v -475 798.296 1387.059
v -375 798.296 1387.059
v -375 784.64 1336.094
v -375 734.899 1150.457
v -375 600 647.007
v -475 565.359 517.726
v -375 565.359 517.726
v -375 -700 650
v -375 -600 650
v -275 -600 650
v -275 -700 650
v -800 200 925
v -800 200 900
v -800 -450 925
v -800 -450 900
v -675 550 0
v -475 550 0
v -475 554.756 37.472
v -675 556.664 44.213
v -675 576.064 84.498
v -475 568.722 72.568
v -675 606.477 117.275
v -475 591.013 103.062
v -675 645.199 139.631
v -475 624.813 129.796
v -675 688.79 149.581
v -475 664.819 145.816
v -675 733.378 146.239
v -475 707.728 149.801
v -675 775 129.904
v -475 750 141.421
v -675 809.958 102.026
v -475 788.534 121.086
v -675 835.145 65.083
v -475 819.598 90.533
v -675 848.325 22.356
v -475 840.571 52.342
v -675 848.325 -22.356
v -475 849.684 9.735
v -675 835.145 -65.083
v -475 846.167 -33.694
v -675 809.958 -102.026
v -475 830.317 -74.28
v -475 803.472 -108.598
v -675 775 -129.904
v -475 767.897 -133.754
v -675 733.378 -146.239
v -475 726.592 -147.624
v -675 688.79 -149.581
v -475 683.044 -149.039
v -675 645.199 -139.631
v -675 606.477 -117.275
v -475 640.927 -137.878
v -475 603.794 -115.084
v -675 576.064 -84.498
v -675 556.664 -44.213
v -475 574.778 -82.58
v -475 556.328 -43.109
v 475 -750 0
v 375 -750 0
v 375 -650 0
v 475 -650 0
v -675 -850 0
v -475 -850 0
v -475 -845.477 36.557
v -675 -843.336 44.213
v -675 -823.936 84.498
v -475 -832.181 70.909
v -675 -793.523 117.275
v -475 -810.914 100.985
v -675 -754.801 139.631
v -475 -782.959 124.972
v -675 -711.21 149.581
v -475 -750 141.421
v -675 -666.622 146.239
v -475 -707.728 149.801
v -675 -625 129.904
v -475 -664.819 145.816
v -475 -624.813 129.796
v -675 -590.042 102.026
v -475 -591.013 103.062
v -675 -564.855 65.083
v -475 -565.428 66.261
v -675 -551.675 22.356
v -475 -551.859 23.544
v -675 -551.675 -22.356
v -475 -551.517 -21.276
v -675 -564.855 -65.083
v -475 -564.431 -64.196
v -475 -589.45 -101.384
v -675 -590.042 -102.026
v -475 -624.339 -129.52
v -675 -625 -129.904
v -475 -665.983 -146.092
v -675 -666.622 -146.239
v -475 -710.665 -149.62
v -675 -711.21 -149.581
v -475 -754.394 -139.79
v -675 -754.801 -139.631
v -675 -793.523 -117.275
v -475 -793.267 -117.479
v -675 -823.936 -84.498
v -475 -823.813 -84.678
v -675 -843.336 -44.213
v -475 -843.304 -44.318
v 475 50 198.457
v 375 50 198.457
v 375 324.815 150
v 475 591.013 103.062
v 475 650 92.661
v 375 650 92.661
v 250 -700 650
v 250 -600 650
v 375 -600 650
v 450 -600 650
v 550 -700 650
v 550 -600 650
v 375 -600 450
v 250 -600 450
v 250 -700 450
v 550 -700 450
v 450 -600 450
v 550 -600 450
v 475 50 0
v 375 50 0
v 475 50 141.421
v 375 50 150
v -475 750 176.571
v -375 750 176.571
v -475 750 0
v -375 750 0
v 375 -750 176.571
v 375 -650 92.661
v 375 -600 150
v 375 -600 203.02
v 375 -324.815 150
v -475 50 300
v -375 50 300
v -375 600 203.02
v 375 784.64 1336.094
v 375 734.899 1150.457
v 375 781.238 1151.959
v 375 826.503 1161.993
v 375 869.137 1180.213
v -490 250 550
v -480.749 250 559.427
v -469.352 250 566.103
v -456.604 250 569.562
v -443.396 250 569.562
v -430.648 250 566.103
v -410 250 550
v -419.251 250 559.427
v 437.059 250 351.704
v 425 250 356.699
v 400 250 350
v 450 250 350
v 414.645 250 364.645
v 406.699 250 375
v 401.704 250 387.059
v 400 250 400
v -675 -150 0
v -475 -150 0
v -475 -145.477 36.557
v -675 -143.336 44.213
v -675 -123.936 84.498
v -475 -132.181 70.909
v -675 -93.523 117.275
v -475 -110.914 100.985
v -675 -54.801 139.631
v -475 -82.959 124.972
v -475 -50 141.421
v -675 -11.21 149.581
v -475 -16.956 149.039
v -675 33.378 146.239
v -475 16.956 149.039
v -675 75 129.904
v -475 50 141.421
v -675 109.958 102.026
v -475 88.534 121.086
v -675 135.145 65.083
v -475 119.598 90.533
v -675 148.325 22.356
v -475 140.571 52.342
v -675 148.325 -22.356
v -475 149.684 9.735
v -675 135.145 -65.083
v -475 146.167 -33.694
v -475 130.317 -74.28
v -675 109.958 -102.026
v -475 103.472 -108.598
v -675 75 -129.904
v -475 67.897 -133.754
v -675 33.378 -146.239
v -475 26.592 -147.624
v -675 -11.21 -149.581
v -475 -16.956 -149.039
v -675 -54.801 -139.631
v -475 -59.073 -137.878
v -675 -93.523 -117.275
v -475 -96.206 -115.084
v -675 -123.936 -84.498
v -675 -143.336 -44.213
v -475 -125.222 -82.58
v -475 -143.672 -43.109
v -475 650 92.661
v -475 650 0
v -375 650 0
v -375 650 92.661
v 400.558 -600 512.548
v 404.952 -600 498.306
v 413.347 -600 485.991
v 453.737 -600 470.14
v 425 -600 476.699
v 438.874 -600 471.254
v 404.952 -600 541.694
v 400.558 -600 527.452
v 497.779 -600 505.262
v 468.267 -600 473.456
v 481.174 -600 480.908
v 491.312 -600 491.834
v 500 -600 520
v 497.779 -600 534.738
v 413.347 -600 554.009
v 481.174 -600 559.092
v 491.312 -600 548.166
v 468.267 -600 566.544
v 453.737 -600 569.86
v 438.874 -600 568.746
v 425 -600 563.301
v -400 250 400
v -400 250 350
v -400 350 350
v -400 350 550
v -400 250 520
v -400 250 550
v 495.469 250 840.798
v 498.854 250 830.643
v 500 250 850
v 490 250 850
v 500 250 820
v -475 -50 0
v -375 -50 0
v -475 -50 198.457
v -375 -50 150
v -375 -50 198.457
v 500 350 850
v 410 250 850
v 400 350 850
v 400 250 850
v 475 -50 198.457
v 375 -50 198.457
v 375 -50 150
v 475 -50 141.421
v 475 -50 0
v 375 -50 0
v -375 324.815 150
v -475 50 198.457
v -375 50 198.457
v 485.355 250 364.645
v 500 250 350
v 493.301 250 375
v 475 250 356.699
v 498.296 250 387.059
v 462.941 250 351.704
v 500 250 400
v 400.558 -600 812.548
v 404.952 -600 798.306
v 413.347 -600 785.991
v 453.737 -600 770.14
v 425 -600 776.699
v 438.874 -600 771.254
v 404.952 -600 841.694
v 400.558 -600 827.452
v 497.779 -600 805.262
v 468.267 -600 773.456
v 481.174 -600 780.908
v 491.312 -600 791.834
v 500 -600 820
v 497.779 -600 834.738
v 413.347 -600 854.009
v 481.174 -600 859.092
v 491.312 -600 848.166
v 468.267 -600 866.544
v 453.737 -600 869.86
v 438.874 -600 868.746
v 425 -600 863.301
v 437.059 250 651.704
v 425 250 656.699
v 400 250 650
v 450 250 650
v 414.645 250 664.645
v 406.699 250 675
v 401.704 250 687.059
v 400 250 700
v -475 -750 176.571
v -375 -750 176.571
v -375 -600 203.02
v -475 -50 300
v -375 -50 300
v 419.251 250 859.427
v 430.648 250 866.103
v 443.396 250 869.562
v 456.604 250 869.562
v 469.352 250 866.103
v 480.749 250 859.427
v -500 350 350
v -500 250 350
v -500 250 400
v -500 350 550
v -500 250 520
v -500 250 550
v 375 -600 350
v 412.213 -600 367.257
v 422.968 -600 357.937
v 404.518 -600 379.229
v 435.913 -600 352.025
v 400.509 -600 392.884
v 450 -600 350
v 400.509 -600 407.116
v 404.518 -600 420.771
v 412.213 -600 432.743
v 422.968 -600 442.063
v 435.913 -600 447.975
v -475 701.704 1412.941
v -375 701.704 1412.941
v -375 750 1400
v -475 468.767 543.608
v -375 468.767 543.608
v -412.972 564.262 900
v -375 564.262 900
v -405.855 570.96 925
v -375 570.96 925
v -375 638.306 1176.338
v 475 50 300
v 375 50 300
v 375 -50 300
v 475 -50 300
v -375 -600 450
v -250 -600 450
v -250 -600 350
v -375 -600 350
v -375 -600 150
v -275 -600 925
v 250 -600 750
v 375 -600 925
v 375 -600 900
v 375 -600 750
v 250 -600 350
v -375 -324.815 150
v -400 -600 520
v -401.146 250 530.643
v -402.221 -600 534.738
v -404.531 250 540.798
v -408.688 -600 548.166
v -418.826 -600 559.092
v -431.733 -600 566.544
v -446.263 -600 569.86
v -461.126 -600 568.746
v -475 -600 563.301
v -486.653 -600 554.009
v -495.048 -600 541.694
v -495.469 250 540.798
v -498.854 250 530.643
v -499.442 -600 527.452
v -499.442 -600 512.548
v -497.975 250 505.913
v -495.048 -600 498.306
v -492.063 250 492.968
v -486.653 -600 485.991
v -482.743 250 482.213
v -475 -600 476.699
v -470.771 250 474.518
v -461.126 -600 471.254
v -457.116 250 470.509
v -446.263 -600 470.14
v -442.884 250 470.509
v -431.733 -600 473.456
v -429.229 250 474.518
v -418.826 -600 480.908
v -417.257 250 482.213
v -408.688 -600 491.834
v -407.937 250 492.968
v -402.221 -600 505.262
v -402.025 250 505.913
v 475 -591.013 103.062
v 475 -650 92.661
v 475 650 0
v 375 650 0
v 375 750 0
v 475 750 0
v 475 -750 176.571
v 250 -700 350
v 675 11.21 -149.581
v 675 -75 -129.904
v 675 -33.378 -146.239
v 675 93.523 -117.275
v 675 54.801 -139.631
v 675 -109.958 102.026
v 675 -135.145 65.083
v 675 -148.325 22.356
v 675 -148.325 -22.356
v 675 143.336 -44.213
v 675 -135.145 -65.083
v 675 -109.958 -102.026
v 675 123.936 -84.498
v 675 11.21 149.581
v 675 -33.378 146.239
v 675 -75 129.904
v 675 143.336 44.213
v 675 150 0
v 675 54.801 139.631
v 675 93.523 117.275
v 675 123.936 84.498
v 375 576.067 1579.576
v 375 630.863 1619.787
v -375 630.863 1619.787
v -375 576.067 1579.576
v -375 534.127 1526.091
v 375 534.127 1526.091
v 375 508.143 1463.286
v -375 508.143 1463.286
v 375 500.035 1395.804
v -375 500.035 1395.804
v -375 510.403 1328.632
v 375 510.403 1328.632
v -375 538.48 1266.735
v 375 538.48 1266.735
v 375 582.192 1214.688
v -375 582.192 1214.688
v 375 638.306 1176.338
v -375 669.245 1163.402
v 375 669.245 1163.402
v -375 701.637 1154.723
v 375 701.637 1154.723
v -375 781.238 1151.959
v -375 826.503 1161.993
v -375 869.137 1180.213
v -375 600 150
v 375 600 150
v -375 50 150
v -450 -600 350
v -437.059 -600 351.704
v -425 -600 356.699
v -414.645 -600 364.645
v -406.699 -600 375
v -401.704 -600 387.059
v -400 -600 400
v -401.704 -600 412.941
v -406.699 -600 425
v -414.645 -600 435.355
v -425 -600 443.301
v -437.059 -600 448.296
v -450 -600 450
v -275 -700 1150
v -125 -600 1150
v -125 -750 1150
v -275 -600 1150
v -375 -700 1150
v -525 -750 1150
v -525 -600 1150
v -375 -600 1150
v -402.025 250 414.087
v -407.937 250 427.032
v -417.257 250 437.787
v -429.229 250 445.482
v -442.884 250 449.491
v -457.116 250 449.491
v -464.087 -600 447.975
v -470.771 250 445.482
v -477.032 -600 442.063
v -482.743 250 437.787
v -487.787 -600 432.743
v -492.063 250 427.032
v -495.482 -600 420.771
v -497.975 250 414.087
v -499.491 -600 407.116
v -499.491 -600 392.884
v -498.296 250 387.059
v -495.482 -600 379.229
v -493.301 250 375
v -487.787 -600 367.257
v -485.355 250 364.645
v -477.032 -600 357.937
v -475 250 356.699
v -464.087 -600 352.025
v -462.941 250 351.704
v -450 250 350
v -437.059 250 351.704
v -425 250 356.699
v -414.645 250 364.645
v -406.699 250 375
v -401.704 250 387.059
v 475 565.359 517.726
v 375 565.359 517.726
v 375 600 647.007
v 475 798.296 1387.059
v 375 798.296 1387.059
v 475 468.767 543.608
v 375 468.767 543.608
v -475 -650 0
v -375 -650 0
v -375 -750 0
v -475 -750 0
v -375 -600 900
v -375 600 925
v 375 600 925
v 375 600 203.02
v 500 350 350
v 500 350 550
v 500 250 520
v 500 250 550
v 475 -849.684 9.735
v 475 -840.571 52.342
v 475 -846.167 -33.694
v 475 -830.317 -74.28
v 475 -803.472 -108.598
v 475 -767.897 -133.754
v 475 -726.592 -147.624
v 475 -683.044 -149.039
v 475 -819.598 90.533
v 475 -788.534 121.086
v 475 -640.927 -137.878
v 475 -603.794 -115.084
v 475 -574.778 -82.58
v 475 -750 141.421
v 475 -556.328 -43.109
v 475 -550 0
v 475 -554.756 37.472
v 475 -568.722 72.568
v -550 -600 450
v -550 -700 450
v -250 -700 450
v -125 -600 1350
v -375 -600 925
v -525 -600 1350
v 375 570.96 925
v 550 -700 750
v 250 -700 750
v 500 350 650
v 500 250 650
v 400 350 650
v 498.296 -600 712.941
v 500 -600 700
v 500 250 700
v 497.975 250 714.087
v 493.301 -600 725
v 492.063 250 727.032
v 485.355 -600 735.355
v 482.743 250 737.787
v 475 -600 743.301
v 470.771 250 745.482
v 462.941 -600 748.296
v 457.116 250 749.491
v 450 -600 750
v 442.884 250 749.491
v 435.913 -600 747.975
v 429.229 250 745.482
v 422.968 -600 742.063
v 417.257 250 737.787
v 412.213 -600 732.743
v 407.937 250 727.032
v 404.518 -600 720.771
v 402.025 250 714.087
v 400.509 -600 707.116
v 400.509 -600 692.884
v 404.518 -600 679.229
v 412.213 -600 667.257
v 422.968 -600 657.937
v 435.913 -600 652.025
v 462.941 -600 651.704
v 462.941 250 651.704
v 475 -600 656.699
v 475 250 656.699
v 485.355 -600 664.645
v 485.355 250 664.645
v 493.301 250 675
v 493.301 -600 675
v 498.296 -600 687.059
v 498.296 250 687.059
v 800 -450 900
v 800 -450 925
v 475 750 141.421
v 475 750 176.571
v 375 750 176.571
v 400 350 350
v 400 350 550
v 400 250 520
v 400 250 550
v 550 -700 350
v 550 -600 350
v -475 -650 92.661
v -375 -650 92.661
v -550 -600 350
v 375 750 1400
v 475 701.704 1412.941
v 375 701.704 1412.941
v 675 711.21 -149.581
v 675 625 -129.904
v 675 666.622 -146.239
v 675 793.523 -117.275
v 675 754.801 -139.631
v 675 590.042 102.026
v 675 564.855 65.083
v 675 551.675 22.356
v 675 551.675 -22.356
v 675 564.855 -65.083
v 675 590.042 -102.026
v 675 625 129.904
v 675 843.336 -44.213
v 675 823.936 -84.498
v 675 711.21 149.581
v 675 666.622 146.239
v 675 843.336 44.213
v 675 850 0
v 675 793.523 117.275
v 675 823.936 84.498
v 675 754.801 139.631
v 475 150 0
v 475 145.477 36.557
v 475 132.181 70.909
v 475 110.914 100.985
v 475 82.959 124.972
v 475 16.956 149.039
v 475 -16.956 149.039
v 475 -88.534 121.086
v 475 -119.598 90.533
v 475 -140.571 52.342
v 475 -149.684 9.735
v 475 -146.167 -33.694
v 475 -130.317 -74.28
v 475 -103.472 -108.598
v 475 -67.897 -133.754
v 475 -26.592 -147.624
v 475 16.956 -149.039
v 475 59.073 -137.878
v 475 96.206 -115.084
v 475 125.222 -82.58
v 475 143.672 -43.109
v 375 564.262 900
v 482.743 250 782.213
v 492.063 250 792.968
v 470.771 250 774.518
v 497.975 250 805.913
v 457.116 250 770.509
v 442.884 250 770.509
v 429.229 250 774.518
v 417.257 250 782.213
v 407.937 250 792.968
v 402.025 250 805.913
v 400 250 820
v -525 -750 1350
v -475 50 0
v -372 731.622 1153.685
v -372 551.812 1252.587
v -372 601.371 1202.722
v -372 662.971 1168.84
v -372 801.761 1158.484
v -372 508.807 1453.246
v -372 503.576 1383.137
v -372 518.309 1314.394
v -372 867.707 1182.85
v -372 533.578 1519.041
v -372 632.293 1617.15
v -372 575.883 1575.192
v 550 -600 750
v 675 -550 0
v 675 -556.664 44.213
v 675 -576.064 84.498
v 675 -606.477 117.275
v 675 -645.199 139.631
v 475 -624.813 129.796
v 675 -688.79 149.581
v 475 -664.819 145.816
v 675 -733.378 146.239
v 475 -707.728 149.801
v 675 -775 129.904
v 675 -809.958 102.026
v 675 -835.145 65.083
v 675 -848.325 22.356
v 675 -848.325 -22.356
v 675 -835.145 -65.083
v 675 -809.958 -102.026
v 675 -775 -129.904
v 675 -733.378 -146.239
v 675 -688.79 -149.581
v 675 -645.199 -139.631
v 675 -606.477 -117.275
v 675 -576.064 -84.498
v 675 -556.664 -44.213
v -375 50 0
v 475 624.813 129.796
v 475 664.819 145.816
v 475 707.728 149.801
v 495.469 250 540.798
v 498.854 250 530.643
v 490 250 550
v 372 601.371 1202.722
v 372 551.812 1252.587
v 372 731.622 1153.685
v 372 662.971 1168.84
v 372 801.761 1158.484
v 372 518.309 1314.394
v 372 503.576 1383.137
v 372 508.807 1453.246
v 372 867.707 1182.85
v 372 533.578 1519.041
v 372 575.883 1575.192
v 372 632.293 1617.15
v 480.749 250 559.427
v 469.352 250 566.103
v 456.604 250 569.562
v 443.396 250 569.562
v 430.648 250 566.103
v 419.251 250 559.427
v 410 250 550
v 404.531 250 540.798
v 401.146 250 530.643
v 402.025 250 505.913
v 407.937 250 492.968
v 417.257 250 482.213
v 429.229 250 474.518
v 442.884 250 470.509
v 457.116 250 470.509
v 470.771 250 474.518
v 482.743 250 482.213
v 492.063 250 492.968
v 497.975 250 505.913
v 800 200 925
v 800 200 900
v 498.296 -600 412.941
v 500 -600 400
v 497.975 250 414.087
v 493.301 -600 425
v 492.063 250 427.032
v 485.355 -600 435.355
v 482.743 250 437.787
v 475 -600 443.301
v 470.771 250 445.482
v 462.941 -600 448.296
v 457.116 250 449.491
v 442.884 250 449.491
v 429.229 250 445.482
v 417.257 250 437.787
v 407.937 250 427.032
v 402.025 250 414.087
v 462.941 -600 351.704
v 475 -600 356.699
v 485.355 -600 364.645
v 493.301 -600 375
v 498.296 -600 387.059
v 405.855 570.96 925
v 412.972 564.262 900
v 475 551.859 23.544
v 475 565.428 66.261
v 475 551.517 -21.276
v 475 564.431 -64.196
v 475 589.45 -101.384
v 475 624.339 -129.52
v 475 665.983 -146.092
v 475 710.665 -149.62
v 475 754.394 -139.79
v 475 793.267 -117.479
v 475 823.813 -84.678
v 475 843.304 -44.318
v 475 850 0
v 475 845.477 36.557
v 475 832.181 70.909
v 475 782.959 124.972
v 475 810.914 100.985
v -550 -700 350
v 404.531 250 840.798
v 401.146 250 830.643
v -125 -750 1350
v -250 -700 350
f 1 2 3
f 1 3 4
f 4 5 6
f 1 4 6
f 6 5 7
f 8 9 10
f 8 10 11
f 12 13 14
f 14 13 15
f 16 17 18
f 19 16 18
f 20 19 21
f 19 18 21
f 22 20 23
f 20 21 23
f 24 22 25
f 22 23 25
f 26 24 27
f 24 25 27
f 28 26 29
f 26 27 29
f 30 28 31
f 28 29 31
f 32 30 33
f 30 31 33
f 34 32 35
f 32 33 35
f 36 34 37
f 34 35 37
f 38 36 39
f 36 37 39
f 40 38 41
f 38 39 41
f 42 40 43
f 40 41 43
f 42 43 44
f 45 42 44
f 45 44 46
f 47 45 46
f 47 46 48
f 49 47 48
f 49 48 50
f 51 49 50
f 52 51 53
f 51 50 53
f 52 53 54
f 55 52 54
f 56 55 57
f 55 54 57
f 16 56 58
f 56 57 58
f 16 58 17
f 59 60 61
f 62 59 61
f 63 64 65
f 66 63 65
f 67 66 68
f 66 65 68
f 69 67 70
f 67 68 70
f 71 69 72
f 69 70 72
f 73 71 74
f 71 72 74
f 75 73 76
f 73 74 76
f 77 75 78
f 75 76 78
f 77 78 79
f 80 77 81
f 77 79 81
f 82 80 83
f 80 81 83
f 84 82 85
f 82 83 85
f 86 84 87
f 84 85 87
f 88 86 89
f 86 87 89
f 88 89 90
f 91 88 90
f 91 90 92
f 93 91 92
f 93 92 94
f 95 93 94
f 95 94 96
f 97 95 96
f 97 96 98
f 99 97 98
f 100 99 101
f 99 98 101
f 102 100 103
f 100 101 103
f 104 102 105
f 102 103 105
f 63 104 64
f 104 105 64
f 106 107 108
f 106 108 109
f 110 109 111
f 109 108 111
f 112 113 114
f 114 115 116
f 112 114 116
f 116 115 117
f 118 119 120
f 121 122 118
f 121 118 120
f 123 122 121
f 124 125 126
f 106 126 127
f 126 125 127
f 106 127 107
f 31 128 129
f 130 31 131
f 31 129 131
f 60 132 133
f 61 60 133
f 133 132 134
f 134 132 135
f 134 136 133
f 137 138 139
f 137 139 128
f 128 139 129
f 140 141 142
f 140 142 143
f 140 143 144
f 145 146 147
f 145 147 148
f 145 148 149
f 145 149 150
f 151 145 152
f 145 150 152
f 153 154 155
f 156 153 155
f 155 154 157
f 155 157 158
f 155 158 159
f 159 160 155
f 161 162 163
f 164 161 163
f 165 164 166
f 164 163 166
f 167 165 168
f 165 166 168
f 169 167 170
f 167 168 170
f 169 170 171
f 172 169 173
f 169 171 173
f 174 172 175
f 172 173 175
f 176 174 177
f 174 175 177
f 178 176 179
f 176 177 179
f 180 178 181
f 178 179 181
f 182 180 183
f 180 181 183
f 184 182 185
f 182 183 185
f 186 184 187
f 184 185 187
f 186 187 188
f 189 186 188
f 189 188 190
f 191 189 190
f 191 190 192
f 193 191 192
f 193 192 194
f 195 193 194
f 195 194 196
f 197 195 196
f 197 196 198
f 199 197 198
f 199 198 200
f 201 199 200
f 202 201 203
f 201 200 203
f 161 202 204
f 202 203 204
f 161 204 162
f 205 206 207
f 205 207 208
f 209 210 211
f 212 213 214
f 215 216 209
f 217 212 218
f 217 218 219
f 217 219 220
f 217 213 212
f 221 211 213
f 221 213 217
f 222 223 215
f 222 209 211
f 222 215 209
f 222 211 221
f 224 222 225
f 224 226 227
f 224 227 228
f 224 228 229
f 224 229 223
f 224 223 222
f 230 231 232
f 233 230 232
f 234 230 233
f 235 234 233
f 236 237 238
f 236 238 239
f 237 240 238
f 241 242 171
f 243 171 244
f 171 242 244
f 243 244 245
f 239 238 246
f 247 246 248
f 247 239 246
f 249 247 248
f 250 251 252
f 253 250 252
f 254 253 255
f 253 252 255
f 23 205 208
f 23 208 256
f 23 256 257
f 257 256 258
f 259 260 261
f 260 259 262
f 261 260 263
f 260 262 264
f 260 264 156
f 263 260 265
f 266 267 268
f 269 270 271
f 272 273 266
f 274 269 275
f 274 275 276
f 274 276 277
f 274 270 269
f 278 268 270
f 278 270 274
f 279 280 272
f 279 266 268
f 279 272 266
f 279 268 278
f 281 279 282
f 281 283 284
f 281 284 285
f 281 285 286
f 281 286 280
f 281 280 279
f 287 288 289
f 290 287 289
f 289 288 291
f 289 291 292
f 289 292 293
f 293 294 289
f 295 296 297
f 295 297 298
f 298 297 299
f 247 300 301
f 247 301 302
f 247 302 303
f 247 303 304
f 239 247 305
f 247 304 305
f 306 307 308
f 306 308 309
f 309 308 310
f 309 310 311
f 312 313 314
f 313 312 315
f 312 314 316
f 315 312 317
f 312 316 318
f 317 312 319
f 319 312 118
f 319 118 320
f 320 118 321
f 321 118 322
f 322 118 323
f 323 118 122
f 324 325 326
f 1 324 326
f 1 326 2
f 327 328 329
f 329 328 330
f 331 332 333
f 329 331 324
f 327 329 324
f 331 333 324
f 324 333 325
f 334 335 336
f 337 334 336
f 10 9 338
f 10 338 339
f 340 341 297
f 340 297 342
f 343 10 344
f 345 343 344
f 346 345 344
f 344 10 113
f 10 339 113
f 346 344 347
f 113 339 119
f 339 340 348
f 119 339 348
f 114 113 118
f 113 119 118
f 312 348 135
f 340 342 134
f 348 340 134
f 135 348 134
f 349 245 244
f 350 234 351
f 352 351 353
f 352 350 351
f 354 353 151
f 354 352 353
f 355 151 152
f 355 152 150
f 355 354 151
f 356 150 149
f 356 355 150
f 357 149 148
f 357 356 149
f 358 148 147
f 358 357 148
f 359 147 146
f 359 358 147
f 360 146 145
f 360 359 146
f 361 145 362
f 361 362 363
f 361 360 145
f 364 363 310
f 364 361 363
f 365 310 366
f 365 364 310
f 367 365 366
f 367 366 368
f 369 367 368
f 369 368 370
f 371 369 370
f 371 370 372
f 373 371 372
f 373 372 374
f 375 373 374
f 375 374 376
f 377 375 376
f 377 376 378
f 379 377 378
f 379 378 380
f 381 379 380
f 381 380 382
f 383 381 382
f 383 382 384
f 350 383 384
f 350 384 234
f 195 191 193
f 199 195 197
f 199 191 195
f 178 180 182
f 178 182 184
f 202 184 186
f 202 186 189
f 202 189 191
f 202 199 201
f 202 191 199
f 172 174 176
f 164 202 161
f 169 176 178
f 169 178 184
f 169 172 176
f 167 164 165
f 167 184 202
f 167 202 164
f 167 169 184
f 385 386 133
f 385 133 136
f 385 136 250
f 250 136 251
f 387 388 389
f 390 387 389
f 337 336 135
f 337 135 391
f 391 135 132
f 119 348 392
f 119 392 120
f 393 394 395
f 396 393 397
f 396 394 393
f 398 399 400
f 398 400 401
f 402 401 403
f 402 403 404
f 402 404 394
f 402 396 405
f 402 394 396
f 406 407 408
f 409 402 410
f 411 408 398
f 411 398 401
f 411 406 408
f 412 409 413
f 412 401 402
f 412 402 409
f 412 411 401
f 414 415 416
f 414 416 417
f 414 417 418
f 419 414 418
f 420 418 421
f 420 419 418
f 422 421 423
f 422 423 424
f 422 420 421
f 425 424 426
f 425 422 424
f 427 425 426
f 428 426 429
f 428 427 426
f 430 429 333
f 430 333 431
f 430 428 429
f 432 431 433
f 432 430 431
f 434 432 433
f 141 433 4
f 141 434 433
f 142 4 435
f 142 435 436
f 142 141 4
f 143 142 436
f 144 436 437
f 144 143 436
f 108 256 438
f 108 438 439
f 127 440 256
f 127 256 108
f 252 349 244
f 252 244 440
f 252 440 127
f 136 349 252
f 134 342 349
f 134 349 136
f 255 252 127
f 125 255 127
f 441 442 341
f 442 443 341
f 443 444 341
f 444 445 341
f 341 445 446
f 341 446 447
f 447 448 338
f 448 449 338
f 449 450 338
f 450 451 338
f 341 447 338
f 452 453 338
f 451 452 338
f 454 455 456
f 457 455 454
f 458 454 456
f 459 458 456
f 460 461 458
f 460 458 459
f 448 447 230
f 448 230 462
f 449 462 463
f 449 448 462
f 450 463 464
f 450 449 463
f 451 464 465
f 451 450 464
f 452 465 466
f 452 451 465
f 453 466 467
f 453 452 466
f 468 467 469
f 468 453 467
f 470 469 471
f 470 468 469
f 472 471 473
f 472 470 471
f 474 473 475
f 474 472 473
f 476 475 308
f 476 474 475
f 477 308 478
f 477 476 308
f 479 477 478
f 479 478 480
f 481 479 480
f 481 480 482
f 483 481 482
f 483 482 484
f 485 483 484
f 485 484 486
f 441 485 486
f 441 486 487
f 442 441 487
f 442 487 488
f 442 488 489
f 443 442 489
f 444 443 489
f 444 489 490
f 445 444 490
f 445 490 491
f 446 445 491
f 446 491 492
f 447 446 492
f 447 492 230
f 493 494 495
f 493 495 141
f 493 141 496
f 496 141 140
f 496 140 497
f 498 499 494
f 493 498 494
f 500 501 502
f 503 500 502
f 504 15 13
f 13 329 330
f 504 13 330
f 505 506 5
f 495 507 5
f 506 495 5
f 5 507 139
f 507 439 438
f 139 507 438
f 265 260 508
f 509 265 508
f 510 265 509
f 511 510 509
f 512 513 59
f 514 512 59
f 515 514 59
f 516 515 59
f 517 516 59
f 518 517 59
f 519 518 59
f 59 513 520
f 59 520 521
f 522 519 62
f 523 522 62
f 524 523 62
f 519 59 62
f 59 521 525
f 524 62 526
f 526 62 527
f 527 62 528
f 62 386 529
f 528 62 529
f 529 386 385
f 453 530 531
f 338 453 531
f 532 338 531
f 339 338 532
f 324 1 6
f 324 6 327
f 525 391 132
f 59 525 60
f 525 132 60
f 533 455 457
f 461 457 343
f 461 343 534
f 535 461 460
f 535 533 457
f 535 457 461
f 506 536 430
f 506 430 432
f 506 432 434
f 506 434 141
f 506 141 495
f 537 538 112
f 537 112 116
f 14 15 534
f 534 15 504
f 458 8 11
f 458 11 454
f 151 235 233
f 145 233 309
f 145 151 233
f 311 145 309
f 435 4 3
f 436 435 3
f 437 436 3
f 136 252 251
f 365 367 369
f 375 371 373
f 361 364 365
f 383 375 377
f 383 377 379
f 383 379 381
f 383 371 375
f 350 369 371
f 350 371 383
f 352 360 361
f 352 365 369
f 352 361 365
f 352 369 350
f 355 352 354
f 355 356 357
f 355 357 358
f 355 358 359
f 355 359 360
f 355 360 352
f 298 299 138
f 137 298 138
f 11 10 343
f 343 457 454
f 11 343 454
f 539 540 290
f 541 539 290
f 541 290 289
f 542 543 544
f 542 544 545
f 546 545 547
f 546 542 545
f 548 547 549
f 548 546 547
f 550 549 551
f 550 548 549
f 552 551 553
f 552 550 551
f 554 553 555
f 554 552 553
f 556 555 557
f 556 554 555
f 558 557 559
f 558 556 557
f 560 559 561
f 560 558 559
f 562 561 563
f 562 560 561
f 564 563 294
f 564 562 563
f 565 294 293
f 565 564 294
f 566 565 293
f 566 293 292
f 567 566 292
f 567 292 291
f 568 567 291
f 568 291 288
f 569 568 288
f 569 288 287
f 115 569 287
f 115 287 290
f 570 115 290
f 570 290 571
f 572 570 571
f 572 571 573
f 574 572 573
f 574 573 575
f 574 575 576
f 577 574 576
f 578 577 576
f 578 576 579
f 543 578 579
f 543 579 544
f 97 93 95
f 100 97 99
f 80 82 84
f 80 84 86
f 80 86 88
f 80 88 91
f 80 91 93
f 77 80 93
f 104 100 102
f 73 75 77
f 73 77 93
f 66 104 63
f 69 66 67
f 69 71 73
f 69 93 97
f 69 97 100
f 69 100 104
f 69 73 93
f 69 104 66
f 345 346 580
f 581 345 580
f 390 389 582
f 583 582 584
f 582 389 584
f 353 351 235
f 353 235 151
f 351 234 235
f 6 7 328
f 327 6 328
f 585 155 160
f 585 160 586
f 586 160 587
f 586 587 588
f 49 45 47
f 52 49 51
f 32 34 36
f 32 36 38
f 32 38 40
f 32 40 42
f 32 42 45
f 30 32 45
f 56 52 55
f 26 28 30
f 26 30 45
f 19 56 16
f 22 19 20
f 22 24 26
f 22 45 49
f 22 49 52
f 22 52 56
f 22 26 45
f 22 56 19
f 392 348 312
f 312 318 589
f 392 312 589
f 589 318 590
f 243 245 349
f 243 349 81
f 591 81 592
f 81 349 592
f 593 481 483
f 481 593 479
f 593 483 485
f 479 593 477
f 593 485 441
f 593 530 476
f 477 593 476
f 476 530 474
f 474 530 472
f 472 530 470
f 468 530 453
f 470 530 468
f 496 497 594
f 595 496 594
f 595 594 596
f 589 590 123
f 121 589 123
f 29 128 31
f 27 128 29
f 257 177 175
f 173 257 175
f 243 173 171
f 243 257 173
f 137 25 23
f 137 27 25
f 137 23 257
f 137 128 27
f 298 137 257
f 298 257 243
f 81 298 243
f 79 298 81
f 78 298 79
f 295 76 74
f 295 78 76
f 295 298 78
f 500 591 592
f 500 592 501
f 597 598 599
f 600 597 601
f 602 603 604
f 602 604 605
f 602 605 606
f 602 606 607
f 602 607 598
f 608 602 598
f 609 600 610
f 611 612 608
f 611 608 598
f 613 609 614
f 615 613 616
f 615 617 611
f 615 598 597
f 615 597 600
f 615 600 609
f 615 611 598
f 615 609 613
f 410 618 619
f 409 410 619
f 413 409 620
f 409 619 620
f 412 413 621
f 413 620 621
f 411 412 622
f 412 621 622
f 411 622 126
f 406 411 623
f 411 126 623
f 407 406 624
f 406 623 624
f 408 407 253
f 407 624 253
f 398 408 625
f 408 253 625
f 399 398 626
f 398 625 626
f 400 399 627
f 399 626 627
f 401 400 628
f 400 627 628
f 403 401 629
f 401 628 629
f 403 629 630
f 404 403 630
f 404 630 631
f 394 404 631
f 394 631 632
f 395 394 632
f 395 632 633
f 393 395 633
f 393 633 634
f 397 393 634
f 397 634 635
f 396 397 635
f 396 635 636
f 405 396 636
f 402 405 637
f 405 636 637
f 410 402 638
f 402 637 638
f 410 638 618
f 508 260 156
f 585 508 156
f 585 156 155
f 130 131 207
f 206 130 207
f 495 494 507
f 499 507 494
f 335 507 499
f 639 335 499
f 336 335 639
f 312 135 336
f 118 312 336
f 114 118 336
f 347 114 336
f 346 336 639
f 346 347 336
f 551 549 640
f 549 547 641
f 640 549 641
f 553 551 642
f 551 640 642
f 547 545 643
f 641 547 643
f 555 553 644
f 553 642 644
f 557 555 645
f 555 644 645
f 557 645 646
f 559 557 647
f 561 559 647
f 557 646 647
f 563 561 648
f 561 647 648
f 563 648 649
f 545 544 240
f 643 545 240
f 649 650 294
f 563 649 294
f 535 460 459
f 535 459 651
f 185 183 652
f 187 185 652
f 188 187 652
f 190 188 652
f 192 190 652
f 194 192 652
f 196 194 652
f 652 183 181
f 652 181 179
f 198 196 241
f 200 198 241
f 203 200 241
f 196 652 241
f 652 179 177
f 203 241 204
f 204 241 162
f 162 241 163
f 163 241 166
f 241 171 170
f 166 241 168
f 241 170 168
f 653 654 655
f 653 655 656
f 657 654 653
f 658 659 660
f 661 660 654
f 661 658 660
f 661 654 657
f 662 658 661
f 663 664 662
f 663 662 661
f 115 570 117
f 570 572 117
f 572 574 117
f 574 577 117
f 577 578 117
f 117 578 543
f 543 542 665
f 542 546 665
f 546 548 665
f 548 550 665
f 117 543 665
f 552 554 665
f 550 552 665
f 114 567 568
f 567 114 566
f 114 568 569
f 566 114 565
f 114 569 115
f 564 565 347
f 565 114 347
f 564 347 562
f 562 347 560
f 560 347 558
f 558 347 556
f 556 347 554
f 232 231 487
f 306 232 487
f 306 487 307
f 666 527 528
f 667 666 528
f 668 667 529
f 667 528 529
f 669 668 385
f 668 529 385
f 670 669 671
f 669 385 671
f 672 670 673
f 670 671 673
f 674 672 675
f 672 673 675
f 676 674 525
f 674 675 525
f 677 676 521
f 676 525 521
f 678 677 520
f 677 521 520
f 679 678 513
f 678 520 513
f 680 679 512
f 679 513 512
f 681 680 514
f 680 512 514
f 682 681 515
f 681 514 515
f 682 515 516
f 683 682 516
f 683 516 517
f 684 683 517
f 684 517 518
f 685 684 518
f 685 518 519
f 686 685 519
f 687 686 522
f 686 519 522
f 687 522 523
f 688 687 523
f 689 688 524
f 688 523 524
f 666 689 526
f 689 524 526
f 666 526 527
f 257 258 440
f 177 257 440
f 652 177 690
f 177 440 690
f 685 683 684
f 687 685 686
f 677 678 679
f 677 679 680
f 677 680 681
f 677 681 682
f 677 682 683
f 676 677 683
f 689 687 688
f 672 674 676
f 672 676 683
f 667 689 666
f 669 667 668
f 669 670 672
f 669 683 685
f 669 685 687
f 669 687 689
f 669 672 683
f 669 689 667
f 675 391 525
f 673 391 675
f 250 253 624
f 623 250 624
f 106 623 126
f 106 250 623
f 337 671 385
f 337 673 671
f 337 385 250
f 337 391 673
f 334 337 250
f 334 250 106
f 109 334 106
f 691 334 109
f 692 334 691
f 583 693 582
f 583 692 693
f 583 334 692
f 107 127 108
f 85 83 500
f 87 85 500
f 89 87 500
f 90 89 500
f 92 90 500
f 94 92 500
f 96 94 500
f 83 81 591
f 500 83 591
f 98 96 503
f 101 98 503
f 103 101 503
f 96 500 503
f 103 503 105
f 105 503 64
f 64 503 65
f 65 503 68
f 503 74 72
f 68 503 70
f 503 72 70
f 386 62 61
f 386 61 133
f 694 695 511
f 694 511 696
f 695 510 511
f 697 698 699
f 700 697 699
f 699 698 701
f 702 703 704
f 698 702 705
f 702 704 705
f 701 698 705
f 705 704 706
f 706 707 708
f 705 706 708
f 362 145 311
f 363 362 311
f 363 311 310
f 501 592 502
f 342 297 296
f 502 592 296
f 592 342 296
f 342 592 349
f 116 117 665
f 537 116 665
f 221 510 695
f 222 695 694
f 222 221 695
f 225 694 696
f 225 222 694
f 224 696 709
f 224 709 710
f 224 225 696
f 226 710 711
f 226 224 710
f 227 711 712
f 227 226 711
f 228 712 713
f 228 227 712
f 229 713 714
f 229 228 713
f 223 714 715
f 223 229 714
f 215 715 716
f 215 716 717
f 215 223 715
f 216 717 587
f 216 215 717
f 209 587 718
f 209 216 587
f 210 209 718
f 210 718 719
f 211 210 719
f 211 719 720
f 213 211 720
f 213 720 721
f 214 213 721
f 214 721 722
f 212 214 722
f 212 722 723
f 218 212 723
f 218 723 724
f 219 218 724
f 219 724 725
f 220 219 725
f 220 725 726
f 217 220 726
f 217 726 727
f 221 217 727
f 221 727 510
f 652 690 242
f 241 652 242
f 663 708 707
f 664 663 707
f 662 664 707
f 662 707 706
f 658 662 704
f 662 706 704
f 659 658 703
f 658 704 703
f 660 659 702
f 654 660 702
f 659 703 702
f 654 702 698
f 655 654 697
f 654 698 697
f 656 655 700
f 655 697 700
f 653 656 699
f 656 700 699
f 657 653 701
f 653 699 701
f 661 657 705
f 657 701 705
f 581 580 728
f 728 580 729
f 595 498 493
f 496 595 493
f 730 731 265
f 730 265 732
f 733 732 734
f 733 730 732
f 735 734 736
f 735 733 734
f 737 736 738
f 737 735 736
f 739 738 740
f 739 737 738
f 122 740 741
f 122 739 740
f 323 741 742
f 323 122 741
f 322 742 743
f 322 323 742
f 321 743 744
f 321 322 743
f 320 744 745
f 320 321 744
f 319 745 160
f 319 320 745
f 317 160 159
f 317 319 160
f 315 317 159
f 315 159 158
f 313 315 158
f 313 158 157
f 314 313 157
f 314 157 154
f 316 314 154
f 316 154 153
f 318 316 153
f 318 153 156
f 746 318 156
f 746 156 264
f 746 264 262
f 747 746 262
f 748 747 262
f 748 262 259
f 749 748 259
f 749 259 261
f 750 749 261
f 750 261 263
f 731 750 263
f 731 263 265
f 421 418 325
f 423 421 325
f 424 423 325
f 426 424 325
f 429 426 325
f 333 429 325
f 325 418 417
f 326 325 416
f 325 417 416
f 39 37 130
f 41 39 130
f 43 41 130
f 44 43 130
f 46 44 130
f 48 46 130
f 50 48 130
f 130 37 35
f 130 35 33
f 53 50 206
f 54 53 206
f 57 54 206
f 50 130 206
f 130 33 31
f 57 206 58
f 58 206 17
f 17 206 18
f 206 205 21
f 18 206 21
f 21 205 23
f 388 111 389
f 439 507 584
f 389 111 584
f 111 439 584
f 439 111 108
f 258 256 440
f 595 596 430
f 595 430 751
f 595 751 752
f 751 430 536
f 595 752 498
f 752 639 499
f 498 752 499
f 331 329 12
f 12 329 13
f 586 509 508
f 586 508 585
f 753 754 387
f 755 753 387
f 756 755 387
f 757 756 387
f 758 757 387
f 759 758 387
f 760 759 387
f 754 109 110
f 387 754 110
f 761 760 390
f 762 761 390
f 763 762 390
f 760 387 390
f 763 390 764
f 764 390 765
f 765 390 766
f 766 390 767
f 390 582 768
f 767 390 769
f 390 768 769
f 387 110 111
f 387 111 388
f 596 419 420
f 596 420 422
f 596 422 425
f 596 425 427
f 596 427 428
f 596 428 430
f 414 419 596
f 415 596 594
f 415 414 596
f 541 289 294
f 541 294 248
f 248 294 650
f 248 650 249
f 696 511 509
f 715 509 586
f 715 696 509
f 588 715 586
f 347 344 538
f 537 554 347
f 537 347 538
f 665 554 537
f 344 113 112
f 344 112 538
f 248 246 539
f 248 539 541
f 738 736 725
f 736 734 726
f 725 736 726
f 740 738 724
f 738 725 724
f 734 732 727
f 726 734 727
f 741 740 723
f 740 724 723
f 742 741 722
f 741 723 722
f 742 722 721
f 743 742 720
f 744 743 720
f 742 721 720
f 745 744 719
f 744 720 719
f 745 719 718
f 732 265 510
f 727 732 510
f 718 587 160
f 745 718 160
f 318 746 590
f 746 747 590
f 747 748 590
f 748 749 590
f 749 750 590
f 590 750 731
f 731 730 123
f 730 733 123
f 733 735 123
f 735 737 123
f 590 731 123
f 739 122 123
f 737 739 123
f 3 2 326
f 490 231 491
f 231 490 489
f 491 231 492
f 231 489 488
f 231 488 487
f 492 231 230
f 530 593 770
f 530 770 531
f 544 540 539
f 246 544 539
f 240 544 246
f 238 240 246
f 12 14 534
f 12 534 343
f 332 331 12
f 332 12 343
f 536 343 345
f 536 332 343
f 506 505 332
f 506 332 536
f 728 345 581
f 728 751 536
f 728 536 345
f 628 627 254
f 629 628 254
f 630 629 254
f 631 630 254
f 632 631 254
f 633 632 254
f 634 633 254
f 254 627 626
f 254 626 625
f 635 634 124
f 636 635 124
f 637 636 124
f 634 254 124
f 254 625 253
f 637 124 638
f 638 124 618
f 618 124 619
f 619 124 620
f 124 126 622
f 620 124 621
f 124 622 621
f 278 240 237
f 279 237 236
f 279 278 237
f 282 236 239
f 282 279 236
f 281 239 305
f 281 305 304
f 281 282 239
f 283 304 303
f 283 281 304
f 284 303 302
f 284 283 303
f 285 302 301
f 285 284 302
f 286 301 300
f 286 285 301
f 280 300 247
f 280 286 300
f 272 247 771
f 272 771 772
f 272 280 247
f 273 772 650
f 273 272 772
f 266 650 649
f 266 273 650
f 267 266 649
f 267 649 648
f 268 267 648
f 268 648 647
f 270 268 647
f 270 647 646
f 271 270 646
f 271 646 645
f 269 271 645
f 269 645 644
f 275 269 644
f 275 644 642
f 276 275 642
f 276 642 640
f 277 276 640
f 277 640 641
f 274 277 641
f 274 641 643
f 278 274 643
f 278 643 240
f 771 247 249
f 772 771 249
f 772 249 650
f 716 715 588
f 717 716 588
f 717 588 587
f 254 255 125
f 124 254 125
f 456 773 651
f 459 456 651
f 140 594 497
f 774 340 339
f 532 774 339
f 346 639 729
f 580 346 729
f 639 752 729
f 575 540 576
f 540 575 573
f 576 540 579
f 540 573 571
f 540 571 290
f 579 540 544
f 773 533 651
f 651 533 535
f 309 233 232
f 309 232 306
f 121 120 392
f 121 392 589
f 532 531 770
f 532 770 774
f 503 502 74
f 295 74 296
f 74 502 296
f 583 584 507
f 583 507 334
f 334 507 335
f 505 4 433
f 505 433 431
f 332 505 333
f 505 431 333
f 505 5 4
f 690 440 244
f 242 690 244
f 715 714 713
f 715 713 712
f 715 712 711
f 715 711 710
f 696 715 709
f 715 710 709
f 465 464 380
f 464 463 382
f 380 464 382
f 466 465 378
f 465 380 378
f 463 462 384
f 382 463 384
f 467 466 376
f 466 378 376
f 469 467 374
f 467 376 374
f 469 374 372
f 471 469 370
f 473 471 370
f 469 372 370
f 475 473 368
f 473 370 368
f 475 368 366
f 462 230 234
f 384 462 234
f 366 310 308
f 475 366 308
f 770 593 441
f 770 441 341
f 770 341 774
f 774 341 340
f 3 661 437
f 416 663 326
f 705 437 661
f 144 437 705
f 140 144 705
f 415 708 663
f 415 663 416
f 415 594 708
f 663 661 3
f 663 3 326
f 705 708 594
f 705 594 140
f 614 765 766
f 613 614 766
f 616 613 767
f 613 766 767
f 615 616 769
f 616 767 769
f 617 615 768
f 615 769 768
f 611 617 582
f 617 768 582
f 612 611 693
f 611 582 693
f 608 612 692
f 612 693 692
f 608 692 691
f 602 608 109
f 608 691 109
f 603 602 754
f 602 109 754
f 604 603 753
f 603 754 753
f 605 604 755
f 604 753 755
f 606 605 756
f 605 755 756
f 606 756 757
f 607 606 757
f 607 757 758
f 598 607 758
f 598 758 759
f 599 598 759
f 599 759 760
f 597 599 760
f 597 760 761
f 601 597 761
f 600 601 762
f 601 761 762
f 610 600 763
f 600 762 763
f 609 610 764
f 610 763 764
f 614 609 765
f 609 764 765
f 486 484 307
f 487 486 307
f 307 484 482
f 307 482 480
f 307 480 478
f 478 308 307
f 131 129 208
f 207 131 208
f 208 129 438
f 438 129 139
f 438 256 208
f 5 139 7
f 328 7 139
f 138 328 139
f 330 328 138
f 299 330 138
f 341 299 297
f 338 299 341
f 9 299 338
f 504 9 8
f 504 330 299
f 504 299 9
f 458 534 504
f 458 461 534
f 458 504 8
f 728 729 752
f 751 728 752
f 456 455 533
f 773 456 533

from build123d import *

# Parameters (mm, degrees)
F0_W      = 750
F0_H      = 750
F1_DEPTH  = 600
F3_DEPTH  = 25
F4_W      = 100
F4_H      = 500
F5_DEPTH  = 100
F6_W      = 400
F6_H      = 200
F7_DEPTH  = 150
F10_DEPTH = 100
F11_DEPTH = 100
F12_R     = 150
F14_DEPTH = 200
F13_R     = 150
F15_DEPTH = 200
F17_DEPTH = 375
F18_T     = -3
F21_DEPTH = 100
F22_DEPTH = 100
F23_R     = 50
F24_DEPTH = 850
F25_W     = 300
F25_H     = 100
F26_DEPTH = 100
F30_W     = 100
F30_H     = 200
F31_DEPTH = 100


with BuildPart() as f1:
    # F0 (on Front) → F1 (new body, symmetric)
    with BuildSketch(Plane.XZ):
        with Locations((0, 525)):
            Rectangle(F0_W, F0_H)
    extrude(amount=F1_DEPTH, both=True)

    # F2 (on face) → F3 (join)
    with BuildSketch(Plane.XY.offset(900)):
        Polygon((-800, -450), (-375, -600), (375, -600), (800, -450), (800, 200), (375, 600), (-375, 600), (-800, 200), align=None)
    extrude(amount=F3_DEPTH)

    # F4 (on face) → F5 (join)
    with BuildSketch(Plane(origin=(-375, 0, 0), x_dir=(0, -1, 0), z_dir=(-1, 0, 0))):
        with Locations((650, 900)):
            Rectangle(F4_W, F4_H)
    extrude(amount=-F5_DEPTH)

    # F6 (on face) → F7 (join)
    with BuildSketch(Plane(origin=(0, -600, 0), x_dir=(-1, 0, 0), z_dir=(0, 1, 0))):
        with Locations((325, 1250)):
            Rectangle(F6_W, F6_H)
    extrude(amount=-F7_DEPTH)

    # F8 (on face) → F10 (join)
    with BuildSketch(Plane(origin=(-375, 0, 0), x_dir=(0, -1, 0), z_dir=(-1, 0, 0))):
        Polygon((50, 300), (-50, 300), (-750, 176.5711135041), (-750, 0), (-650, 0), (-650, 92.6611503863), (-50, 198.4573388114), (-50, 0), (50, 0), (50, 198.4573388114), (650, 92.6611503863), (650, 0), (750, 0), (750, 176.5711135041), align=None)
    extrude(amount=F10_DEPTH)

    # F9 (on face) → F11 (join)
    with BuildSketch(Plane.YZ.offset(375)):
        Polygon((-750, 176.5711135041), (-750, 0), (-650, 0), (-650, 92.6611503863), (-50, 198.4573388114), (-50, 0), (50, 0), (50, 198.4573388114), (650, 92.6611503863), (650, 0), (750, 0), (750, 176.5711135041), (50, 300), (-50, 300), align=None)
    extrude(amount=F11_DEPTH)

    # F12 (on face) → F14 (join)
    with BuildSketch(Plane.YZ.offset(475)):
        with Locations((-700, 0)):
            Circle(F12_R)
        Circle(F12_R)
        with Locations((700, 0)):
            Circle(F12_R)
    extrude(amount=F14_DEPTH)

    # F13 (on face) → F15 (join)
    with BuildSketch(Plane(origin=(-475, 0, 0), x_dir=(0, -1, 0), z_dir=(-1, 0, 0))):
        with Locations((-700, 0)):
            Circle(F13_R)
        Circle(F13_R)
        with Locations((700, 0)):
            Circle(F13_R)
    extrude(amount=F15_DEPTH)



with BuildPart() as f17:
    # F16 (on Right) → F17 (new body, symmetric)
    with BuildSketch(Plane.YZ):
        with BuildLine():
            Line((869.1369255612, 1180.2128462175), (630.8630744388, 1619.7871537825))
            ThreePointArc((630.8630744388, 1619.7871537825), (530.2128462175, 1280.8630744388), (869.1369255612, 1180.2128462175))
        make_face()
    extrude(amount=F17_DEPTH, both=True)

    # F18
    f18_openings = [f17.faces().sort_by_distance(p)[0] for p in [
        (0, 750, 1400),
    ]]
    offset(amount=F18_T, openings=f18_openings)


with BuildPart() as f1_1:
    add(f1.part)

    add(f17.part)  # F21 merges F17
    # F19 (on face) → F21 (join)
    with BuildSketch(Plane(origin=(-375, 0, 0), x_dir=(0, -1, 0), z_dir=(-1, 0, 0))):
        Polygon((-468.7665680933, 543.607708595), (-701.7037086855, 1412.9409522551), (-798.2962913145, 1387.0590477449), (-565.3591507222, 517.7258040847), align=None)
    extrude(amount=F21_DEPTH)

    # F20 (on face) → F22 (join)
    with BuildSketch(Plane.YZ.offset(375)):
        Polygon((701.7037086855, 1412.9409522551), (468.7665680933, 543.607708595), (565.3591507222, 517.7258040847), (798.2962913145, 1387.0590477449), align=None)
    extrude(amount=F22_DEPTH)



with BuildPart() as f24:
    # F23 (on face) → F24 (new body)
    with BuildSketch(Plane.XZ.offset(600)):
        with Locations((450, 820)):
            Circle(F23_R)
    extrude(amount=-F24_DEPTH)


with BuildPart() as f24b:
    # F23 (on face) → F24, piece 2 (new body)
    with BuildSketch(Plane.XZ.offset(600)):
        with Locations((450, 700)):
            Circle(F23_R)
    extrude(amount=-F24_DEPTH)


with BuildPart() as f24c:
    # F23 (on face) → F24, piece 3 (new body)
    with BuildSketch(Plane.XZ.offset(600)):
        with Locations((450, 520)):
            Circle(F23_R)
    extrude(amount=-F24_DEPTH)


with BuildPart() as f24d:
    # F23 (on face) → F24, piece 4 (new body)
    with BuildSketch(Plane.XZ.offset(600)):
        with Locations((450, 400)):
            Circle(F23_R)
    extrude(amount=-F24_DEPTH)


with BuildPart() as f24e:
    # F23 (on face) → F24, piece 5 (new body)
    with BuildSketch(Plane.XZ.offset(600)):
        with Locations((-450, 520)):
            Circle(F23_R)
    extrude(amount=-F24_DEPTH)


with BuildPart() as f24f:
    # F23 (on face) → F24, piece 6 (new body)
    with BuildSketch(Plane.XZ.offset(600)):
        with Locations((-450, 400)):
            Circle(F23_R)
    extrude(amount=-F24_DEPTH)


with BuildPart() as f1_2:
    add(f1_1.part)

    add(f24b.part)  # F26 merges F24b

    add(f24d.part)  # F26 merges F24d

    add(f24f.part)  # F26 merges F24f
    # F25 (on face) → F26 (join)
    with BuildSketch(Plane.XZ.offset(600)):
        with Locations((-400, 400)):
            Rectangle(F25_W, F25_H)
        with Locations((400, 400)):
            Rectangle(F25_W, F25_H)
        with Locations((400, 700)):
            Rectangle(F25_W, F25_H)
    extrude(amount=F26_DEPTH)

    # F27: union 

    # F28: union 

    # F29: union 


    add(f24.part)  # F31 merges F24

    add(f24c.part)  # F31 merges F24c

    add(f24e.part)  # F31 merges F24e
    # F30 (on face) → F31 (join)
    with BuildSketch(Plane(origin=(0, 250, 0), x_dir=(-1, 0, 0), z_dir=(0, 1, 0))):
        with Locations((-450, 450)):
            Rectangle(F30_W, F30_H)
        with Locations((450, 450)):
            Rectangle(F30_W, F30_H)
        with Locations((-450, 750)):
            Rectangle(F30_W, F30_H)
    extrude(amount=F31_DEPTH)


solid = f1_2.part
